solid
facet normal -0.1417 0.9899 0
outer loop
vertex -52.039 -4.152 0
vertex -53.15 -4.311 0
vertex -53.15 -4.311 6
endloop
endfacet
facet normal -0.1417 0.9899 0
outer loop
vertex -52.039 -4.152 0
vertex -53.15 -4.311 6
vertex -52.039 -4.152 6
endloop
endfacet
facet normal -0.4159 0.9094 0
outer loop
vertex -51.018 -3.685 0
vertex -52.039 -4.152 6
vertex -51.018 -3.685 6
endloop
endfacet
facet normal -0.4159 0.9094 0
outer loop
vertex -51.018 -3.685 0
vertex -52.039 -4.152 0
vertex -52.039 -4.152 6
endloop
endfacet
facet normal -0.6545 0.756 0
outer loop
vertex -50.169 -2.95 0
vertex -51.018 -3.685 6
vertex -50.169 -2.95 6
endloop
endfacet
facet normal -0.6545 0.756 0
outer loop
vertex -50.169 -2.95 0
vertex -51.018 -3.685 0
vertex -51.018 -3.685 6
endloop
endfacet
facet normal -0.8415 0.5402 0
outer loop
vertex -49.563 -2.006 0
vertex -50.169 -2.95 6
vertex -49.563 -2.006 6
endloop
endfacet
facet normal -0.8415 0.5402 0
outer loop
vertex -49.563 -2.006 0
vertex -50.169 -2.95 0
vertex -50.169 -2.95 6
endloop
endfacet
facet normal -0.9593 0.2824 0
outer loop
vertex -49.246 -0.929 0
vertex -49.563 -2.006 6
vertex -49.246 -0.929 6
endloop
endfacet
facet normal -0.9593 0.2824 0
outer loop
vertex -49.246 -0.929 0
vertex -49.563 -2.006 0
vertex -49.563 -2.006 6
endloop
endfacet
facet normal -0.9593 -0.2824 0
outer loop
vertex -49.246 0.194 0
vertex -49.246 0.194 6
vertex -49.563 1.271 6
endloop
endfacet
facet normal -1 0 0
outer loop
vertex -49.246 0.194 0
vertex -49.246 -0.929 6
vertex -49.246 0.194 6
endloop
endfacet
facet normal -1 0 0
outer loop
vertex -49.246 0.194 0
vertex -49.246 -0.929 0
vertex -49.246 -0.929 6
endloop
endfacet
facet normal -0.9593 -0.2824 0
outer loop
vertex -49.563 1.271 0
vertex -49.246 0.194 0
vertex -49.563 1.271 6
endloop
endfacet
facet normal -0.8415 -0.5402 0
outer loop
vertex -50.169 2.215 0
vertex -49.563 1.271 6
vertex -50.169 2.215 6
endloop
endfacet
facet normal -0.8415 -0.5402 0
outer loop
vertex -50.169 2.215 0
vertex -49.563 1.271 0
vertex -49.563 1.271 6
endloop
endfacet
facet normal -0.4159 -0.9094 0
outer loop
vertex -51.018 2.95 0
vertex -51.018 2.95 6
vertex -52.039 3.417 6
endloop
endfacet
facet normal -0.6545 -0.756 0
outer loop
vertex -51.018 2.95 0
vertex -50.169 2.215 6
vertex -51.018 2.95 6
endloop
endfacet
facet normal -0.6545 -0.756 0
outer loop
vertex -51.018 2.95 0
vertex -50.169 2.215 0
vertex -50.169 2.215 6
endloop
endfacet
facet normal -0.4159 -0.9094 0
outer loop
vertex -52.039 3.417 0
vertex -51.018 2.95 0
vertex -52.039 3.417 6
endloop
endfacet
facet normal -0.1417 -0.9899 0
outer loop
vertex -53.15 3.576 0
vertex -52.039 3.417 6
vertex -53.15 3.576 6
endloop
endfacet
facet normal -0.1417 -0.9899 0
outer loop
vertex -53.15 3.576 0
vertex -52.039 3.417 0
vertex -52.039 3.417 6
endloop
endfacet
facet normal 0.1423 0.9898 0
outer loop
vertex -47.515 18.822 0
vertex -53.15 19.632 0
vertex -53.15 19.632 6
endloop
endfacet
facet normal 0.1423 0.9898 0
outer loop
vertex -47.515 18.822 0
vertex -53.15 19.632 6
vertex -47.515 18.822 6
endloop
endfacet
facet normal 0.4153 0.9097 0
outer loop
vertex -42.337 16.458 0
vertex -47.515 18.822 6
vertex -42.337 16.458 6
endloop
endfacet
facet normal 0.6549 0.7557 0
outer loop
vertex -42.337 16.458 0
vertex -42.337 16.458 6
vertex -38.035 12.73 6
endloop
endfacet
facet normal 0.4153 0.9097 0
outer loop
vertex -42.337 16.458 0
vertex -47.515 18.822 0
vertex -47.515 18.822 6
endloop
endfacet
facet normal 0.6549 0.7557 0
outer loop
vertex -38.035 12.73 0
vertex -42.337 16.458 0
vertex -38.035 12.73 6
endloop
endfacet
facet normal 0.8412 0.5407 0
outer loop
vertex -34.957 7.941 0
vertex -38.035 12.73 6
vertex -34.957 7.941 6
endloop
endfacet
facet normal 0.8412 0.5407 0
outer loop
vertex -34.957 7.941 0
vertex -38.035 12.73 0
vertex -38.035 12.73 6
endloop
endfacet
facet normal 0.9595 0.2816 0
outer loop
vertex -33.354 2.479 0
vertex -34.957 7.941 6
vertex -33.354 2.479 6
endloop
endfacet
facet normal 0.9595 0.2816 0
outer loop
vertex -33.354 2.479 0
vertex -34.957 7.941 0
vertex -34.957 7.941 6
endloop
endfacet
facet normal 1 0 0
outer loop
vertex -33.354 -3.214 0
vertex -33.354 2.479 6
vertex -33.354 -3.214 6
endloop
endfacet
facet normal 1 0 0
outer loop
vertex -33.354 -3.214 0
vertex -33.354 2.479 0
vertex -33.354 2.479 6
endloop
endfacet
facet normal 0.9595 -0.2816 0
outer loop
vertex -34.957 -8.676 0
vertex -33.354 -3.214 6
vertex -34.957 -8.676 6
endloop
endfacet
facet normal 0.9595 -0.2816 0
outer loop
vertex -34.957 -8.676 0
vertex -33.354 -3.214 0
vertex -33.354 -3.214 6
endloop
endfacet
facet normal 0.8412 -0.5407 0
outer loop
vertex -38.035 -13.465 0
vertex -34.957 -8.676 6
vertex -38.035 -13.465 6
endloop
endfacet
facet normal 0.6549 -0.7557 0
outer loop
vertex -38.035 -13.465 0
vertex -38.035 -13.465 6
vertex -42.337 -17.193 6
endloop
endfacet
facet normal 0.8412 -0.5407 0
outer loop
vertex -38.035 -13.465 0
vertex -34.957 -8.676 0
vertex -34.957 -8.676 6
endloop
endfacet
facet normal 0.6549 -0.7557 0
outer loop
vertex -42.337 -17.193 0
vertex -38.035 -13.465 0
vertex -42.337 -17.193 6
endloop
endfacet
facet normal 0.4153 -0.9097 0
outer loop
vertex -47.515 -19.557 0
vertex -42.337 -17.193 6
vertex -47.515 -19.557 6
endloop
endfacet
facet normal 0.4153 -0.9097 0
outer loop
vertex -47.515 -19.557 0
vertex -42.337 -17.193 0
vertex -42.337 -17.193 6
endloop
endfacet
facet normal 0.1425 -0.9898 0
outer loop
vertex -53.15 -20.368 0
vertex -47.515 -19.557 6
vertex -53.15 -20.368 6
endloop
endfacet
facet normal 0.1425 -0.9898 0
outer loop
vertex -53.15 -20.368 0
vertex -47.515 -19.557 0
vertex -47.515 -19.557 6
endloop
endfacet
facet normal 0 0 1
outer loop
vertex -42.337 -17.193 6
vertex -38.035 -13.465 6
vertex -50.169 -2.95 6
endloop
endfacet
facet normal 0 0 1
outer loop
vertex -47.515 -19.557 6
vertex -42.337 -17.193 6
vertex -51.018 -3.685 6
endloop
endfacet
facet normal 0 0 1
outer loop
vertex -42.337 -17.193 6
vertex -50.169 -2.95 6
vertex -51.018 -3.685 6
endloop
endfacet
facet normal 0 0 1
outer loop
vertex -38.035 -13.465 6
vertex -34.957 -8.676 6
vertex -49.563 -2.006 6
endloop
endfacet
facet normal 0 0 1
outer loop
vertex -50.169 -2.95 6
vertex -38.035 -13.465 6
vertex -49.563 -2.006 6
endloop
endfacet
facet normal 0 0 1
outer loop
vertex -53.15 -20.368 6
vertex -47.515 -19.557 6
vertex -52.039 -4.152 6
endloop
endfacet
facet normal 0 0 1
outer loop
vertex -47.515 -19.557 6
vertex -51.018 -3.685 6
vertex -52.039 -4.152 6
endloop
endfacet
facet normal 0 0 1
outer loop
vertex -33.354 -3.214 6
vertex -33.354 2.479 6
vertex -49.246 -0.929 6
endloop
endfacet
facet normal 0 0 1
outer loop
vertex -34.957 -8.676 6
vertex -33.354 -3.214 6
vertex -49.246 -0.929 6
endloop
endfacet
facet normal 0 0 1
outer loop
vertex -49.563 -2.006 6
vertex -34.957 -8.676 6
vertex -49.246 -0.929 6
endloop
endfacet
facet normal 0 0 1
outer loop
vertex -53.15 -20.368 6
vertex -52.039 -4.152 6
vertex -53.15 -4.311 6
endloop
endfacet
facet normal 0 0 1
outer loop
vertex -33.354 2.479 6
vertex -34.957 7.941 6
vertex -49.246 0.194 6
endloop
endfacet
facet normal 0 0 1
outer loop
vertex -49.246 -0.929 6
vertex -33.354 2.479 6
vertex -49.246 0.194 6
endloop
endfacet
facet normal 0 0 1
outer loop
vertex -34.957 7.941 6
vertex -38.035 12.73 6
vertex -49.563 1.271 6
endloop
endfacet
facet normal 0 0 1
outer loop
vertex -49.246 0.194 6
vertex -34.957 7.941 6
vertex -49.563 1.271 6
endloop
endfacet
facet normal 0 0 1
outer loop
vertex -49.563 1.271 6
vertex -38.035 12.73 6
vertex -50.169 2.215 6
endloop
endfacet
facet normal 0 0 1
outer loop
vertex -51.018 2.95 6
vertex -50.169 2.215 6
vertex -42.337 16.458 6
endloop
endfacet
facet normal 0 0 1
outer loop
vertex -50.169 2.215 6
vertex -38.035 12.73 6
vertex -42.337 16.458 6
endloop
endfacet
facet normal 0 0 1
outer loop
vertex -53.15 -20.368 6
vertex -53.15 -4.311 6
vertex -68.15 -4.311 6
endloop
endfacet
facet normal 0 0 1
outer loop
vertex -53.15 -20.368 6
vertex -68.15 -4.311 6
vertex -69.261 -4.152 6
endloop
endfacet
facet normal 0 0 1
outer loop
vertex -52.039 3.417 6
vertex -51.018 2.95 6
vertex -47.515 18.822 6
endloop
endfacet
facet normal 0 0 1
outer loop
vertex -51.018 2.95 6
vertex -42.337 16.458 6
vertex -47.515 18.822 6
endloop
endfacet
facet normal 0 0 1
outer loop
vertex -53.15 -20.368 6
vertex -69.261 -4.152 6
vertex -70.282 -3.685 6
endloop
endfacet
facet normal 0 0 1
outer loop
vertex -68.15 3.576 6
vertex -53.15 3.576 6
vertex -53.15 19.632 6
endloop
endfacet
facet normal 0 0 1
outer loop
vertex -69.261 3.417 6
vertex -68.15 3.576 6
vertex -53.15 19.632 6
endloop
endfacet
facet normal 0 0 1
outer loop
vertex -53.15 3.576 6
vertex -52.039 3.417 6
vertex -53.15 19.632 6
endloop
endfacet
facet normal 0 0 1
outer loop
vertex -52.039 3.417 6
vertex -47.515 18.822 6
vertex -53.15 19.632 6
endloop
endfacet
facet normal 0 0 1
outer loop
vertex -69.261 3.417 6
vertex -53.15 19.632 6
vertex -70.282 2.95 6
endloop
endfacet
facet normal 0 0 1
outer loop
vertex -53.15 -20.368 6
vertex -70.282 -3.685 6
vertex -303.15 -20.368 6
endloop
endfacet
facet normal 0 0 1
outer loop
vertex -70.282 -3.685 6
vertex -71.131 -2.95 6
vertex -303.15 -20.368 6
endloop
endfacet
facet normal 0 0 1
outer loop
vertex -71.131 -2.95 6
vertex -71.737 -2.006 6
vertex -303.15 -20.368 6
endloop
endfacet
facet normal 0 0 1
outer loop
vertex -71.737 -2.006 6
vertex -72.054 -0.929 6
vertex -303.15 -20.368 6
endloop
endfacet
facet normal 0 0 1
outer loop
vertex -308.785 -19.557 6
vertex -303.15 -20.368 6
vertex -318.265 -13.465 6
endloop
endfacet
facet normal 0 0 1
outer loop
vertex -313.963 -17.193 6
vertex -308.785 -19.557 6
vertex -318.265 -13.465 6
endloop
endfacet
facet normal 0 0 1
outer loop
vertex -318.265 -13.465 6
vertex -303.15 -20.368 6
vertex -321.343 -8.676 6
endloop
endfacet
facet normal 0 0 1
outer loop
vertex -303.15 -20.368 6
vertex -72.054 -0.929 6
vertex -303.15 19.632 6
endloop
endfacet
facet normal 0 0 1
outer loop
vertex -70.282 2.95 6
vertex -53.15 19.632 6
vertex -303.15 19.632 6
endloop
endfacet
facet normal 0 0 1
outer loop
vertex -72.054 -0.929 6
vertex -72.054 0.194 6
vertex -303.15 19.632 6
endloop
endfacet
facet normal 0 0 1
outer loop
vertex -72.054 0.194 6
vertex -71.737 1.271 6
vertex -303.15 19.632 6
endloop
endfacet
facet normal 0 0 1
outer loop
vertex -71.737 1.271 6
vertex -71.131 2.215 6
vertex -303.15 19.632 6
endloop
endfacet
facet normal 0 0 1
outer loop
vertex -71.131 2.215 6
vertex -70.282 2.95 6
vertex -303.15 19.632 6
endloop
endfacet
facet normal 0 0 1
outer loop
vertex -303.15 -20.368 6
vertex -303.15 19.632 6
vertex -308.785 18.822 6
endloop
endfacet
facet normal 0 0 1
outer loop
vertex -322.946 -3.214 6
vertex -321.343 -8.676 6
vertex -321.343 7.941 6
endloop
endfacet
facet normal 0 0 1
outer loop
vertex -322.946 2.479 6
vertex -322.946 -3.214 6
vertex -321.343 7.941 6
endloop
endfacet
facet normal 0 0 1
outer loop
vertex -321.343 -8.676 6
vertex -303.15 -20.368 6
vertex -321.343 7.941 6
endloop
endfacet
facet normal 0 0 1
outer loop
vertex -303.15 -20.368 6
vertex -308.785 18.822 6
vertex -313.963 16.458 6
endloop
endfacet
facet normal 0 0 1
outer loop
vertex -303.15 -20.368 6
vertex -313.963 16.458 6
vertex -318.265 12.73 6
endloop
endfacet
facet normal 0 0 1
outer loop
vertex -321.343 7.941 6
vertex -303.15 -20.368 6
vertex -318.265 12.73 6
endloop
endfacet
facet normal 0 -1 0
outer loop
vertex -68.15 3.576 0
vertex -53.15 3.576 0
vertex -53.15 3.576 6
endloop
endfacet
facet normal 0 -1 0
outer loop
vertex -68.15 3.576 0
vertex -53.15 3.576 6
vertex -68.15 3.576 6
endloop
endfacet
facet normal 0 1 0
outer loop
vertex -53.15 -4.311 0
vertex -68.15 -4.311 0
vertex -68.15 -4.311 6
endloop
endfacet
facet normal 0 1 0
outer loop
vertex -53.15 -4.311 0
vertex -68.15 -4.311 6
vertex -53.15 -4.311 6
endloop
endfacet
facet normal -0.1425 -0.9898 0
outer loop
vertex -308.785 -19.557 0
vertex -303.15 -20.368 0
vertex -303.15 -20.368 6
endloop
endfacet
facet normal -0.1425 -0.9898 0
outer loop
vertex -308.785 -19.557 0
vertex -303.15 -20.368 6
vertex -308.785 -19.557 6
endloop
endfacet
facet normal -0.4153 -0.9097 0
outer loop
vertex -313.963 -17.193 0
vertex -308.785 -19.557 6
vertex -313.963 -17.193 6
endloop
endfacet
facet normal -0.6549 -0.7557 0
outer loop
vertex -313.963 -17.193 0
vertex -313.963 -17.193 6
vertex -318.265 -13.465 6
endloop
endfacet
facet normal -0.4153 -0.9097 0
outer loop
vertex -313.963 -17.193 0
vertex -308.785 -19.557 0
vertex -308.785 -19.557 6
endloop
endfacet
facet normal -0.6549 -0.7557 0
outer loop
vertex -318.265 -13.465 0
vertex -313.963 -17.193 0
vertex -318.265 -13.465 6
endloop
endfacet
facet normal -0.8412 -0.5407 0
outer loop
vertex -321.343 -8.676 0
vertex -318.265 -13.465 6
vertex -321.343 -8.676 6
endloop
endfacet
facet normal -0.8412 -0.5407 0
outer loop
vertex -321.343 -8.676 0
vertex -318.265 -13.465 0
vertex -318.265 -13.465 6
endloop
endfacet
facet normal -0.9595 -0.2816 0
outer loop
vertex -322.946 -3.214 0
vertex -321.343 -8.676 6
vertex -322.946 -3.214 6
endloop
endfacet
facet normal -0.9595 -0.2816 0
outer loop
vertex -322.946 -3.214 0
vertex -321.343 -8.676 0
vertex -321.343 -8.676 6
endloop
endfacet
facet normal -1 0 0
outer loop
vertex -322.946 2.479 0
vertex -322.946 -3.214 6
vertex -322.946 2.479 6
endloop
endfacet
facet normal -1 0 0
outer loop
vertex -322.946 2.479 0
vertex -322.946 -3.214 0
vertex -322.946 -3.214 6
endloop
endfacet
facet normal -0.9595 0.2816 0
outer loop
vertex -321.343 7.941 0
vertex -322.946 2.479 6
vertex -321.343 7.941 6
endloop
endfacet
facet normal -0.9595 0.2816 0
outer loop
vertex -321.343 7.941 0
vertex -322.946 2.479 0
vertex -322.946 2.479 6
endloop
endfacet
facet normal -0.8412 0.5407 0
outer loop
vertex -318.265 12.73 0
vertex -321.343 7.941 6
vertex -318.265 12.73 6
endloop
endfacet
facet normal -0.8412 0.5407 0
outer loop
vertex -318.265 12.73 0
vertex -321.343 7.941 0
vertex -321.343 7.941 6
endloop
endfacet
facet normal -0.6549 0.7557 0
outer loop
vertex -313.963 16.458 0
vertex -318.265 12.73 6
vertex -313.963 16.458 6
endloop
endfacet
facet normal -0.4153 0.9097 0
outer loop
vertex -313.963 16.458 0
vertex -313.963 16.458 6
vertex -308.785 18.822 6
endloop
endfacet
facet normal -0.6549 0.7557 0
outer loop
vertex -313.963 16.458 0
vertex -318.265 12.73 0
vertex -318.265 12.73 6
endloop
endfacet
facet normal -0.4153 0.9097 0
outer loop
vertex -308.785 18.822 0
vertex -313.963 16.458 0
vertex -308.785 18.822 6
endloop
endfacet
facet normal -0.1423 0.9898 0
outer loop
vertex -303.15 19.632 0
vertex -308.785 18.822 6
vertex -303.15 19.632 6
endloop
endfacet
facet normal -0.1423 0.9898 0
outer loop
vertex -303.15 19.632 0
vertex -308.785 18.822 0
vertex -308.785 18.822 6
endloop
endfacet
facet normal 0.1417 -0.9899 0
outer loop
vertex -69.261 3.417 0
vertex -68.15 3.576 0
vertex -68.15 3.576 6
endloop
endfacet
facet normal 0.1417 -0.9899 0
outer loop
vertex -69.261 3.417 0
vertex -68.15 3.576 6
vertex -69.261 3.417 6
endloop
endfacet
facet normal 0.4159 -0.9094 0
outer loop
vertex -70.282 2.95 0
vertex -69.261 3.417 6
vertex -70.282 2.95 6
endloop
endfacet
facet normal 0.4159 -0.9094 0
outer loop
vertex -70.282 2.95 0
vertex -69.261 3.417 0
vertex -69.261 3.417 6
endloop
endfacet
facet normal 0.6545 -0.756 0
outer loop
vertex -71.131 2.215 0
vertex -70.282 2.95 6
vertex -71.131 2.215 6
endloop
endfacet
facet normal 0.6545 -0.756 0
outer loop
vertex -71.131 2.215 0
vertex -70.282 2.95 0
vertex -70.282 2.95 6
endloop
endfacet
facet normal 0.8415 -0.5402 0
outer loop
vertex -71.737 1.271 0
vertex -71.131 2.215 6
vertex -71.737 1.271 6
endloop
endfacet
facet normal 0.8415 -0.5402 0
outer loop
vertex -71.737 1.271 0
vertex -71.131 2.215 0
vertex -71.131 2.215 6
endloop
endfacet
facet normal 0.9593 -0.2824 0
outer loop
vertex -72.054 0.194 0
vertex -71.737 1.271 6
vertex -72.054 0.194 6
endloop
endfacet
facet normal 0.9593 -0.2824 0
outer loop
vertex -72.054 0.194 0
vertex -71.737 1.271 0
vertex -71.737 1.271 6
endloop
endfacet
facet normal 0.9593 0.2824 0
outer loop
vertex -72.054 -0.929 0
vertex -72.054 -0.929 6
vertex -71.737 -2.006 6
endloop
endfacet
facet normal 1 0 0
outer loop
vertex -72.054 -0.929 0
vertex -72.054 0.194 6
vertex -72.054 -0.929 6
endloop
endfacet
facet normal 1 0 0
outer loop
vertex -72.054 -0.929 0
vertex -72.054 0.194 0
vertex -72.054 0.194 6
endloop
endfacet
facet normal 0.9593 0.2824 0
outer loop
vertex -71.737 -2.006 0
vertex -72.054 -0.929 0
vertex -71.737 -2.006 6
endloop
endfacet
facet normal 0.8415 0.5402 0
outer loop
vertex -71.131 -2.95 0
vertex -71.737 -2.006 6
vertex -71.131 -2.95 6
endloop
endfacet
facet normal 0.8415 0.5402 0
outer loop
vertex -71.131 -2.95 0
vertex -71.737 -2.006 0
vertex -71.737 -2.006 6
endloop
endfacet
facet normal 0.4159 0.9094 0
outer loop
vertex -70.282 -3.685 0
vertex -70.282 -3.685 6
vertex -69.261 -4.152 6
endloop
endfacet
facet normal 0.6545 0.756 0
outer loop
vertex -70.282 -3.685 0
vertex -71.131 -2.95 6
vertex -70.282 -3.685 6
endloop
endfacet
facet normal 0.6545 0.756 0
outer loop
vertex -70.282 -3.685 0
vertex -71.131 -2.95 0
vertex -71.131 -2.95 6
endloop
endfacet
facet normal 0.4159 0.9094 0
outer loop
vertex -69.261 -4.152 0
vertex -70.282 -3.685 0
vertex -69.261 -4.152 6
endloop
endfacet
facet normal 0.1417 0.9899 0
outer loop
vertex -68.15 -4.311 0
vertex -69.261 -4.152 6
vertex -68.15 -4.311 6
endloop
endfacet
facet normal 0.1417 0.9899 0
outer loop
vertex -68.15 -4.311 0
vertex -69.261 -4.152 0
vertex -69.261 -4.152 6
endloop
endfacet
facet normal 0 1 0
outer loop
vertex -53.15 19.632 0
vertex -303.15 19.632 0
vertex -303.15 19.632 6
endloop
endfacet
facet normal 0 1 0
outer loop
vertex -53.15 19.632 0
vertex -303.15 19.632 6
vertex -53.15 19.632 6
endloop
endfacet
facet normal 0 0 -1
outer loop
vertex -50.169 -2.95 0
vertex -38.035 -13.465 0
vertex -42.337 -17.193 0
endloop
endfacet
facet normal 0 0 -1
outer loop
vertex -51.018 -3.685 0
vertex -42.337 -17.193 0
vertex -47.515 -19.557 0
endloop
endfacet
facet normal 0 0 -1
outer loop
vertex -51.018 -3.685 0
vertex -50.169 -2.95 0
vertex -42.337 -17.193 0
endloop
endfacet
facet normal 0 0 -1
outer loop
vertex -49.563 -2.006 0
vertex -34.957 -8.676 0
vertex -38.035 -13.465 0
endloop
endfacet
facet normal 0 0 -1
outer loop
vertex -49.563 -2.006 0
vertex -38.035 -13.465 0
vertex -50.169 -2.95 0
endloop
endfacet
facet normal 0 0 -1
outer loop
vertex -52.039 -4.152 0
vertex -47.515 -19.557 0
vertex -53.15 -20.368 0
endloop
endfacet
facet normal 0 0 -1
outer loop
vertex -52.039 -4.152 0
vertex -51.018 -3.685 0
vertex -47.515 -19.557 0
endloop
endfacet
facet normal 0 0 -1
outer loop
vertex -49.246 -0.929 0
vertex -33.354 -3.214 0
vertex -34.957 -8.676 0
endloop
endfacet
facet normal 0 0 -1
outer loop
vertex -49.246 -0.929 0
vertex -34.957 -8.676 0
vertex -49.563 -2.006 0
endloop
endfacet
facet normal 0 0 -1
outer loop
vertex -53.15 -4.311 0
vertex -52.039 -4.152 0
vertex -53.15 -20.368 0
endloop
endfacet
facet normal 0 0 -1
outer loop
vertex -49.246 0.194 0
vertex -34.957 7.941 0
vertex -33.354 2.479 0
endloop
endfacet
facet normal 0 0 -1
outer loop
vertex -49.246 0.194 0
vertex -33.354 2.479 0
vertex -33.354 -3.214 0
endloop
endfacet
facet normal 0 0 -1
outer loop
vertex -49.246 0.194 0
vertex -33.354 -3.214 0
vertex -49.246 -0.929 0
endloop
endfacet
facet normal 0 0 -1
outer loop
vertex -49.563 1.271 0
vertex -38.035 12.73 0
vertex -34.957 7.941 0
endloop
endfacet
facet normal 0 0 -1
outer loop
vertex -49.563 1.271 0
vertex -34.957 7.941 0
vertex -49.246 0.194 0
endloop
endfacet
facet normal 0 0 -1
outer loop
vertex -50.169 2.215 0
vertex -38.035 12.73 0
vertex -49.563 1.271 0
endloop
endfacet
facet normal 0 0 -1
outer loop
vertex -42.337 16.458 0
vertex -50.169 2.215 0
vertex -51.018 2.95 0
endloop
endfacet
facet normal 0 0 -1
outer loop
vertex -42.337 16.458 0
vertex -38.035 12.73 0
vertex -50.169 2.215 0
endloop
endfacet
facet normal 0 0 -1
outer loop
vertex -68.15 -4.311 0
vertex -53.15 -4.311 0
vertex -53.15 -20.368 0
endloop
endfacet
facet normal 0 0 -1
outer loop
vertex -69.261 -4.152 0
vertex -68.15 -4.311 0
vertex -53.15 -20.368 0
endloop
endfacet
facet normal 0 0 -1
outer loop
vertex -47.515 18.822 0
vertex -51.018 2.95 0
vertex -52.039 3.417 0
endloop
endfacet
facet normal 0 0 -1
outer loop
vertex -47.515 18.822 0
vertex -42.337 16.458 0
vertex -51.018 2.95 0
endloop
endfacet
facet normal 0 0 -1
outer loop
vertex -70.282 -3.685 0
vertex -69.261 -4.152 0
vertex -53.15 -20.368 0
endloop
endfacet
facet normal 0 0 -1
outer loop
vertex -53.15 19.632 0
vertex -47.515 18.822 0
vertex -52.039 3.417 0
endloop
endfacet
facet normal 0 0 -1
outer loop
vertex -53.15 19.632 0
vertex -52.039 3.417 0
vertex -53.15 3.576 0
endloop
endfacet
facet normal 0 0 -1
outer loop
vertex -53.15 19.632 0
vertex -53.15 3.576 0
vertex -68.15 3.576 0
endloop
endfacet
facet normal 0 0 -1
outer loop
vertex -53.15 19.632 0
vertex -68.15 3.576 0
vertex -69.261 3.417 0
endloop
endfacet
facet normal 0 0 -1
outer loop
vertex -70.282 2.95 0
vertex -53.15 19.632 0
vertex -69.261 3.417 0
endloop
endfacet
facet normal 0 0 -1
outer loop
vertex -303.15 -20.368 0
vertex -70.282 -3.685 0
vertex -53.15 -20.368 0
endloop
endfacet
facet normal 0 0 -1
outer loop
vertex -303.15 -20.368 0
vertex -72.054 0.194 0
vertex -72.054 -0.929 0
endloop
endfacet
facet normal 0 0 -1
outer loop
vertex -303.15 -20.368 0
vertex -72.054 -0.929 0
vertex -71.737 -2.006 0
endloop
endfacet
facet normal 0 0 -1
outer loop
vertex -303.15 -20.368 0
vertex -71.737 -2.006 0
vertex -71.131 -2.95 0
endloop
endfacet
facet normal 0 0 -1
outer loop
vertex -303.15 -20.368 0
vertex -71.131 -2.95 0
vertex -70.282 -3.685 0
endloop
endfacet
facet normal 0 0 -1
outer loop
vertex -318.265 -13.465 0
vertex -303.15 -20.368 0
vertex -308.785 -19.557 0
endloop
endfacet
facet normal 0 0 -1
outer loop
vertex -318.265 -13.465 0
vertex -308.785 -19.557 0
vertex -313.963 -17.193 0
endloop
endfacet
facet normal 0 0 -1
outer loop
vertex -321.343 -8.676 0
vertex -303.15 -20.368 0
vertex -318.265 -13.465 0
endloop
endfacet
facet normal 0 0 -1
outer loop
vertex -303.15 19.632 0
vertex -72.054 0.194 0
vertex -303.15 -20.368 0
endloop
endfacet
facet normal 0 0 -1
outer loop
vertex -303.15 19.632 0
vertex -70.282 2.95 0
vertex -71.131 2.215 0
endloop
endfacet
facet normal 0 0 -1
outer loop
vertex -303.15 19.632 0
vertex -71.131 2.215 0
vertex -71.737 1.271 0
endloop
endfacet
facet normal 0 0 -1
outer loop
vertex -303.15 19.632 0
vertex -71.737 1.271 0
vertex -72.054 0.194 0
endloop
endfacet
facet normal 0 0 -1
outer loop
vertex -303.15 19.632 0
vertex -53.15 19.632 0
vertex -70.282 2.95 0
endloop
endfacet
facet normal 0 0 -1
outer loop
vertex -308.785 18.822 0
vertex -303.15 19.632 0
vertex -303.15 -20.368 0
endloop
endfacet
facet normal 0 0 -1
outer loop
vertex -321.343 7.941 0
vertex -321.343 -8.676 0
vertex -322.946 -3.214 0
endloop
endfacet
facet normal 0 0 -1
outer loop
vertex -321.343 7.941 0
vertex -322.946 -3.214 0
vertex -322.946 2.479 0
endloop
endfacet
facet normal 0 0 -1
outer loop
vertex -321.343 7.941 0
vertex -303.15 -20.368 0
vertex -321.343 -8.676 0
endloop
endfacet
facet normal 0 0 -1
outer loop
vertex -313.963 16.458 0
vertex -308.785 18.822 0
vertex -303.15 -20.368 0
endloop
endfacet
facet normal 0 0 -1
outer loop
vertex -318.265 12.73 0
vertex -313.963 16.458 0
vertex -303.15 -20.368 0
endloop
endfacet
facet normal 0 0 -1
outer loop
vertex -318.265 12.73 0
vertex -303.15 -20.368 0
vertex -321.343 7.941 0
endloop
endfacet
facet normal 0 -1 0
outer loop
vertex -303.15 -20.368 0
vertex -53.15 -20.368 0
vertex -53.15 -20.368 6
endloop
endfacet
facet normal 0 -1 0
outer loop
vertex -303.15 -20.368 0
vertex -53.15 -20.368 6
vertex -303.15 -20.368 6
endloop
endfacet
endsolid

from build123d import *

# Parameters (mm, degrees)
BOSS_EXTRUDE1_DEPTH = 6
CUT_EXTRUDE1_REACH  = 8


with BuildPart() as part:
    # Sketch1 → Boss-Extrude1 (new body)
    with BuildSketch(Plane.XY):
        with BuildLine():
            Line((-53.14999664, -20.367507575), (-303.15, -20.367507575))
            ThreePointArc((-303.15, -20.367507575), (-323.15, -0.367507575), (-303.15, 19.632492425))
            Line((-303.15, 19.632492425), (-53.14999664, 19.632492425))
            ThreePointArc((-53.14999664, 19.632492425), (-33.15, -0.367507575), (-53.14999664, -20.367507575))
        make_face()
    extrude(amount=BOSS_EXTRUDE1_DEPTH)

    # Sketch2 → Cut-Extrude1 (cut, up to next)
    with BuildSketch(Plane(origin=(0, 0, 0), x_dir=(-1, 0, 0), z_dir=(0, 0, -1)), mode=Mode.PRIVATE) as cut_extrude1_sk1:
        with BuildLine():
            Line((53.15, 3.576263022), (68.15, 3.576263022))
            ThreePointArc((68.15, 3.576263022), (72.093770597, -0.367507575), (68.15, -4.311278172))
            Line((68.15, -4.311278172), (53.15, -4.311278172))
            ThreePointArc((53.15, -4.311278172), (49.206229403, -0.367507575), (53.15, 3.576263022))
        make_face()
    cut_extrude1_tool1 = extrude(cut_extrude1_sk1.sketch, amount=-CUT_EXTRUDE1_REACH, mode=Mode.PRIVATE) & part.part
    add(cut_extrude1_tool1.solids().sort_by_distance((-60.65, -0.367508, 0))[0], mode=Mode.SUBTRACT)


solid = part.part
